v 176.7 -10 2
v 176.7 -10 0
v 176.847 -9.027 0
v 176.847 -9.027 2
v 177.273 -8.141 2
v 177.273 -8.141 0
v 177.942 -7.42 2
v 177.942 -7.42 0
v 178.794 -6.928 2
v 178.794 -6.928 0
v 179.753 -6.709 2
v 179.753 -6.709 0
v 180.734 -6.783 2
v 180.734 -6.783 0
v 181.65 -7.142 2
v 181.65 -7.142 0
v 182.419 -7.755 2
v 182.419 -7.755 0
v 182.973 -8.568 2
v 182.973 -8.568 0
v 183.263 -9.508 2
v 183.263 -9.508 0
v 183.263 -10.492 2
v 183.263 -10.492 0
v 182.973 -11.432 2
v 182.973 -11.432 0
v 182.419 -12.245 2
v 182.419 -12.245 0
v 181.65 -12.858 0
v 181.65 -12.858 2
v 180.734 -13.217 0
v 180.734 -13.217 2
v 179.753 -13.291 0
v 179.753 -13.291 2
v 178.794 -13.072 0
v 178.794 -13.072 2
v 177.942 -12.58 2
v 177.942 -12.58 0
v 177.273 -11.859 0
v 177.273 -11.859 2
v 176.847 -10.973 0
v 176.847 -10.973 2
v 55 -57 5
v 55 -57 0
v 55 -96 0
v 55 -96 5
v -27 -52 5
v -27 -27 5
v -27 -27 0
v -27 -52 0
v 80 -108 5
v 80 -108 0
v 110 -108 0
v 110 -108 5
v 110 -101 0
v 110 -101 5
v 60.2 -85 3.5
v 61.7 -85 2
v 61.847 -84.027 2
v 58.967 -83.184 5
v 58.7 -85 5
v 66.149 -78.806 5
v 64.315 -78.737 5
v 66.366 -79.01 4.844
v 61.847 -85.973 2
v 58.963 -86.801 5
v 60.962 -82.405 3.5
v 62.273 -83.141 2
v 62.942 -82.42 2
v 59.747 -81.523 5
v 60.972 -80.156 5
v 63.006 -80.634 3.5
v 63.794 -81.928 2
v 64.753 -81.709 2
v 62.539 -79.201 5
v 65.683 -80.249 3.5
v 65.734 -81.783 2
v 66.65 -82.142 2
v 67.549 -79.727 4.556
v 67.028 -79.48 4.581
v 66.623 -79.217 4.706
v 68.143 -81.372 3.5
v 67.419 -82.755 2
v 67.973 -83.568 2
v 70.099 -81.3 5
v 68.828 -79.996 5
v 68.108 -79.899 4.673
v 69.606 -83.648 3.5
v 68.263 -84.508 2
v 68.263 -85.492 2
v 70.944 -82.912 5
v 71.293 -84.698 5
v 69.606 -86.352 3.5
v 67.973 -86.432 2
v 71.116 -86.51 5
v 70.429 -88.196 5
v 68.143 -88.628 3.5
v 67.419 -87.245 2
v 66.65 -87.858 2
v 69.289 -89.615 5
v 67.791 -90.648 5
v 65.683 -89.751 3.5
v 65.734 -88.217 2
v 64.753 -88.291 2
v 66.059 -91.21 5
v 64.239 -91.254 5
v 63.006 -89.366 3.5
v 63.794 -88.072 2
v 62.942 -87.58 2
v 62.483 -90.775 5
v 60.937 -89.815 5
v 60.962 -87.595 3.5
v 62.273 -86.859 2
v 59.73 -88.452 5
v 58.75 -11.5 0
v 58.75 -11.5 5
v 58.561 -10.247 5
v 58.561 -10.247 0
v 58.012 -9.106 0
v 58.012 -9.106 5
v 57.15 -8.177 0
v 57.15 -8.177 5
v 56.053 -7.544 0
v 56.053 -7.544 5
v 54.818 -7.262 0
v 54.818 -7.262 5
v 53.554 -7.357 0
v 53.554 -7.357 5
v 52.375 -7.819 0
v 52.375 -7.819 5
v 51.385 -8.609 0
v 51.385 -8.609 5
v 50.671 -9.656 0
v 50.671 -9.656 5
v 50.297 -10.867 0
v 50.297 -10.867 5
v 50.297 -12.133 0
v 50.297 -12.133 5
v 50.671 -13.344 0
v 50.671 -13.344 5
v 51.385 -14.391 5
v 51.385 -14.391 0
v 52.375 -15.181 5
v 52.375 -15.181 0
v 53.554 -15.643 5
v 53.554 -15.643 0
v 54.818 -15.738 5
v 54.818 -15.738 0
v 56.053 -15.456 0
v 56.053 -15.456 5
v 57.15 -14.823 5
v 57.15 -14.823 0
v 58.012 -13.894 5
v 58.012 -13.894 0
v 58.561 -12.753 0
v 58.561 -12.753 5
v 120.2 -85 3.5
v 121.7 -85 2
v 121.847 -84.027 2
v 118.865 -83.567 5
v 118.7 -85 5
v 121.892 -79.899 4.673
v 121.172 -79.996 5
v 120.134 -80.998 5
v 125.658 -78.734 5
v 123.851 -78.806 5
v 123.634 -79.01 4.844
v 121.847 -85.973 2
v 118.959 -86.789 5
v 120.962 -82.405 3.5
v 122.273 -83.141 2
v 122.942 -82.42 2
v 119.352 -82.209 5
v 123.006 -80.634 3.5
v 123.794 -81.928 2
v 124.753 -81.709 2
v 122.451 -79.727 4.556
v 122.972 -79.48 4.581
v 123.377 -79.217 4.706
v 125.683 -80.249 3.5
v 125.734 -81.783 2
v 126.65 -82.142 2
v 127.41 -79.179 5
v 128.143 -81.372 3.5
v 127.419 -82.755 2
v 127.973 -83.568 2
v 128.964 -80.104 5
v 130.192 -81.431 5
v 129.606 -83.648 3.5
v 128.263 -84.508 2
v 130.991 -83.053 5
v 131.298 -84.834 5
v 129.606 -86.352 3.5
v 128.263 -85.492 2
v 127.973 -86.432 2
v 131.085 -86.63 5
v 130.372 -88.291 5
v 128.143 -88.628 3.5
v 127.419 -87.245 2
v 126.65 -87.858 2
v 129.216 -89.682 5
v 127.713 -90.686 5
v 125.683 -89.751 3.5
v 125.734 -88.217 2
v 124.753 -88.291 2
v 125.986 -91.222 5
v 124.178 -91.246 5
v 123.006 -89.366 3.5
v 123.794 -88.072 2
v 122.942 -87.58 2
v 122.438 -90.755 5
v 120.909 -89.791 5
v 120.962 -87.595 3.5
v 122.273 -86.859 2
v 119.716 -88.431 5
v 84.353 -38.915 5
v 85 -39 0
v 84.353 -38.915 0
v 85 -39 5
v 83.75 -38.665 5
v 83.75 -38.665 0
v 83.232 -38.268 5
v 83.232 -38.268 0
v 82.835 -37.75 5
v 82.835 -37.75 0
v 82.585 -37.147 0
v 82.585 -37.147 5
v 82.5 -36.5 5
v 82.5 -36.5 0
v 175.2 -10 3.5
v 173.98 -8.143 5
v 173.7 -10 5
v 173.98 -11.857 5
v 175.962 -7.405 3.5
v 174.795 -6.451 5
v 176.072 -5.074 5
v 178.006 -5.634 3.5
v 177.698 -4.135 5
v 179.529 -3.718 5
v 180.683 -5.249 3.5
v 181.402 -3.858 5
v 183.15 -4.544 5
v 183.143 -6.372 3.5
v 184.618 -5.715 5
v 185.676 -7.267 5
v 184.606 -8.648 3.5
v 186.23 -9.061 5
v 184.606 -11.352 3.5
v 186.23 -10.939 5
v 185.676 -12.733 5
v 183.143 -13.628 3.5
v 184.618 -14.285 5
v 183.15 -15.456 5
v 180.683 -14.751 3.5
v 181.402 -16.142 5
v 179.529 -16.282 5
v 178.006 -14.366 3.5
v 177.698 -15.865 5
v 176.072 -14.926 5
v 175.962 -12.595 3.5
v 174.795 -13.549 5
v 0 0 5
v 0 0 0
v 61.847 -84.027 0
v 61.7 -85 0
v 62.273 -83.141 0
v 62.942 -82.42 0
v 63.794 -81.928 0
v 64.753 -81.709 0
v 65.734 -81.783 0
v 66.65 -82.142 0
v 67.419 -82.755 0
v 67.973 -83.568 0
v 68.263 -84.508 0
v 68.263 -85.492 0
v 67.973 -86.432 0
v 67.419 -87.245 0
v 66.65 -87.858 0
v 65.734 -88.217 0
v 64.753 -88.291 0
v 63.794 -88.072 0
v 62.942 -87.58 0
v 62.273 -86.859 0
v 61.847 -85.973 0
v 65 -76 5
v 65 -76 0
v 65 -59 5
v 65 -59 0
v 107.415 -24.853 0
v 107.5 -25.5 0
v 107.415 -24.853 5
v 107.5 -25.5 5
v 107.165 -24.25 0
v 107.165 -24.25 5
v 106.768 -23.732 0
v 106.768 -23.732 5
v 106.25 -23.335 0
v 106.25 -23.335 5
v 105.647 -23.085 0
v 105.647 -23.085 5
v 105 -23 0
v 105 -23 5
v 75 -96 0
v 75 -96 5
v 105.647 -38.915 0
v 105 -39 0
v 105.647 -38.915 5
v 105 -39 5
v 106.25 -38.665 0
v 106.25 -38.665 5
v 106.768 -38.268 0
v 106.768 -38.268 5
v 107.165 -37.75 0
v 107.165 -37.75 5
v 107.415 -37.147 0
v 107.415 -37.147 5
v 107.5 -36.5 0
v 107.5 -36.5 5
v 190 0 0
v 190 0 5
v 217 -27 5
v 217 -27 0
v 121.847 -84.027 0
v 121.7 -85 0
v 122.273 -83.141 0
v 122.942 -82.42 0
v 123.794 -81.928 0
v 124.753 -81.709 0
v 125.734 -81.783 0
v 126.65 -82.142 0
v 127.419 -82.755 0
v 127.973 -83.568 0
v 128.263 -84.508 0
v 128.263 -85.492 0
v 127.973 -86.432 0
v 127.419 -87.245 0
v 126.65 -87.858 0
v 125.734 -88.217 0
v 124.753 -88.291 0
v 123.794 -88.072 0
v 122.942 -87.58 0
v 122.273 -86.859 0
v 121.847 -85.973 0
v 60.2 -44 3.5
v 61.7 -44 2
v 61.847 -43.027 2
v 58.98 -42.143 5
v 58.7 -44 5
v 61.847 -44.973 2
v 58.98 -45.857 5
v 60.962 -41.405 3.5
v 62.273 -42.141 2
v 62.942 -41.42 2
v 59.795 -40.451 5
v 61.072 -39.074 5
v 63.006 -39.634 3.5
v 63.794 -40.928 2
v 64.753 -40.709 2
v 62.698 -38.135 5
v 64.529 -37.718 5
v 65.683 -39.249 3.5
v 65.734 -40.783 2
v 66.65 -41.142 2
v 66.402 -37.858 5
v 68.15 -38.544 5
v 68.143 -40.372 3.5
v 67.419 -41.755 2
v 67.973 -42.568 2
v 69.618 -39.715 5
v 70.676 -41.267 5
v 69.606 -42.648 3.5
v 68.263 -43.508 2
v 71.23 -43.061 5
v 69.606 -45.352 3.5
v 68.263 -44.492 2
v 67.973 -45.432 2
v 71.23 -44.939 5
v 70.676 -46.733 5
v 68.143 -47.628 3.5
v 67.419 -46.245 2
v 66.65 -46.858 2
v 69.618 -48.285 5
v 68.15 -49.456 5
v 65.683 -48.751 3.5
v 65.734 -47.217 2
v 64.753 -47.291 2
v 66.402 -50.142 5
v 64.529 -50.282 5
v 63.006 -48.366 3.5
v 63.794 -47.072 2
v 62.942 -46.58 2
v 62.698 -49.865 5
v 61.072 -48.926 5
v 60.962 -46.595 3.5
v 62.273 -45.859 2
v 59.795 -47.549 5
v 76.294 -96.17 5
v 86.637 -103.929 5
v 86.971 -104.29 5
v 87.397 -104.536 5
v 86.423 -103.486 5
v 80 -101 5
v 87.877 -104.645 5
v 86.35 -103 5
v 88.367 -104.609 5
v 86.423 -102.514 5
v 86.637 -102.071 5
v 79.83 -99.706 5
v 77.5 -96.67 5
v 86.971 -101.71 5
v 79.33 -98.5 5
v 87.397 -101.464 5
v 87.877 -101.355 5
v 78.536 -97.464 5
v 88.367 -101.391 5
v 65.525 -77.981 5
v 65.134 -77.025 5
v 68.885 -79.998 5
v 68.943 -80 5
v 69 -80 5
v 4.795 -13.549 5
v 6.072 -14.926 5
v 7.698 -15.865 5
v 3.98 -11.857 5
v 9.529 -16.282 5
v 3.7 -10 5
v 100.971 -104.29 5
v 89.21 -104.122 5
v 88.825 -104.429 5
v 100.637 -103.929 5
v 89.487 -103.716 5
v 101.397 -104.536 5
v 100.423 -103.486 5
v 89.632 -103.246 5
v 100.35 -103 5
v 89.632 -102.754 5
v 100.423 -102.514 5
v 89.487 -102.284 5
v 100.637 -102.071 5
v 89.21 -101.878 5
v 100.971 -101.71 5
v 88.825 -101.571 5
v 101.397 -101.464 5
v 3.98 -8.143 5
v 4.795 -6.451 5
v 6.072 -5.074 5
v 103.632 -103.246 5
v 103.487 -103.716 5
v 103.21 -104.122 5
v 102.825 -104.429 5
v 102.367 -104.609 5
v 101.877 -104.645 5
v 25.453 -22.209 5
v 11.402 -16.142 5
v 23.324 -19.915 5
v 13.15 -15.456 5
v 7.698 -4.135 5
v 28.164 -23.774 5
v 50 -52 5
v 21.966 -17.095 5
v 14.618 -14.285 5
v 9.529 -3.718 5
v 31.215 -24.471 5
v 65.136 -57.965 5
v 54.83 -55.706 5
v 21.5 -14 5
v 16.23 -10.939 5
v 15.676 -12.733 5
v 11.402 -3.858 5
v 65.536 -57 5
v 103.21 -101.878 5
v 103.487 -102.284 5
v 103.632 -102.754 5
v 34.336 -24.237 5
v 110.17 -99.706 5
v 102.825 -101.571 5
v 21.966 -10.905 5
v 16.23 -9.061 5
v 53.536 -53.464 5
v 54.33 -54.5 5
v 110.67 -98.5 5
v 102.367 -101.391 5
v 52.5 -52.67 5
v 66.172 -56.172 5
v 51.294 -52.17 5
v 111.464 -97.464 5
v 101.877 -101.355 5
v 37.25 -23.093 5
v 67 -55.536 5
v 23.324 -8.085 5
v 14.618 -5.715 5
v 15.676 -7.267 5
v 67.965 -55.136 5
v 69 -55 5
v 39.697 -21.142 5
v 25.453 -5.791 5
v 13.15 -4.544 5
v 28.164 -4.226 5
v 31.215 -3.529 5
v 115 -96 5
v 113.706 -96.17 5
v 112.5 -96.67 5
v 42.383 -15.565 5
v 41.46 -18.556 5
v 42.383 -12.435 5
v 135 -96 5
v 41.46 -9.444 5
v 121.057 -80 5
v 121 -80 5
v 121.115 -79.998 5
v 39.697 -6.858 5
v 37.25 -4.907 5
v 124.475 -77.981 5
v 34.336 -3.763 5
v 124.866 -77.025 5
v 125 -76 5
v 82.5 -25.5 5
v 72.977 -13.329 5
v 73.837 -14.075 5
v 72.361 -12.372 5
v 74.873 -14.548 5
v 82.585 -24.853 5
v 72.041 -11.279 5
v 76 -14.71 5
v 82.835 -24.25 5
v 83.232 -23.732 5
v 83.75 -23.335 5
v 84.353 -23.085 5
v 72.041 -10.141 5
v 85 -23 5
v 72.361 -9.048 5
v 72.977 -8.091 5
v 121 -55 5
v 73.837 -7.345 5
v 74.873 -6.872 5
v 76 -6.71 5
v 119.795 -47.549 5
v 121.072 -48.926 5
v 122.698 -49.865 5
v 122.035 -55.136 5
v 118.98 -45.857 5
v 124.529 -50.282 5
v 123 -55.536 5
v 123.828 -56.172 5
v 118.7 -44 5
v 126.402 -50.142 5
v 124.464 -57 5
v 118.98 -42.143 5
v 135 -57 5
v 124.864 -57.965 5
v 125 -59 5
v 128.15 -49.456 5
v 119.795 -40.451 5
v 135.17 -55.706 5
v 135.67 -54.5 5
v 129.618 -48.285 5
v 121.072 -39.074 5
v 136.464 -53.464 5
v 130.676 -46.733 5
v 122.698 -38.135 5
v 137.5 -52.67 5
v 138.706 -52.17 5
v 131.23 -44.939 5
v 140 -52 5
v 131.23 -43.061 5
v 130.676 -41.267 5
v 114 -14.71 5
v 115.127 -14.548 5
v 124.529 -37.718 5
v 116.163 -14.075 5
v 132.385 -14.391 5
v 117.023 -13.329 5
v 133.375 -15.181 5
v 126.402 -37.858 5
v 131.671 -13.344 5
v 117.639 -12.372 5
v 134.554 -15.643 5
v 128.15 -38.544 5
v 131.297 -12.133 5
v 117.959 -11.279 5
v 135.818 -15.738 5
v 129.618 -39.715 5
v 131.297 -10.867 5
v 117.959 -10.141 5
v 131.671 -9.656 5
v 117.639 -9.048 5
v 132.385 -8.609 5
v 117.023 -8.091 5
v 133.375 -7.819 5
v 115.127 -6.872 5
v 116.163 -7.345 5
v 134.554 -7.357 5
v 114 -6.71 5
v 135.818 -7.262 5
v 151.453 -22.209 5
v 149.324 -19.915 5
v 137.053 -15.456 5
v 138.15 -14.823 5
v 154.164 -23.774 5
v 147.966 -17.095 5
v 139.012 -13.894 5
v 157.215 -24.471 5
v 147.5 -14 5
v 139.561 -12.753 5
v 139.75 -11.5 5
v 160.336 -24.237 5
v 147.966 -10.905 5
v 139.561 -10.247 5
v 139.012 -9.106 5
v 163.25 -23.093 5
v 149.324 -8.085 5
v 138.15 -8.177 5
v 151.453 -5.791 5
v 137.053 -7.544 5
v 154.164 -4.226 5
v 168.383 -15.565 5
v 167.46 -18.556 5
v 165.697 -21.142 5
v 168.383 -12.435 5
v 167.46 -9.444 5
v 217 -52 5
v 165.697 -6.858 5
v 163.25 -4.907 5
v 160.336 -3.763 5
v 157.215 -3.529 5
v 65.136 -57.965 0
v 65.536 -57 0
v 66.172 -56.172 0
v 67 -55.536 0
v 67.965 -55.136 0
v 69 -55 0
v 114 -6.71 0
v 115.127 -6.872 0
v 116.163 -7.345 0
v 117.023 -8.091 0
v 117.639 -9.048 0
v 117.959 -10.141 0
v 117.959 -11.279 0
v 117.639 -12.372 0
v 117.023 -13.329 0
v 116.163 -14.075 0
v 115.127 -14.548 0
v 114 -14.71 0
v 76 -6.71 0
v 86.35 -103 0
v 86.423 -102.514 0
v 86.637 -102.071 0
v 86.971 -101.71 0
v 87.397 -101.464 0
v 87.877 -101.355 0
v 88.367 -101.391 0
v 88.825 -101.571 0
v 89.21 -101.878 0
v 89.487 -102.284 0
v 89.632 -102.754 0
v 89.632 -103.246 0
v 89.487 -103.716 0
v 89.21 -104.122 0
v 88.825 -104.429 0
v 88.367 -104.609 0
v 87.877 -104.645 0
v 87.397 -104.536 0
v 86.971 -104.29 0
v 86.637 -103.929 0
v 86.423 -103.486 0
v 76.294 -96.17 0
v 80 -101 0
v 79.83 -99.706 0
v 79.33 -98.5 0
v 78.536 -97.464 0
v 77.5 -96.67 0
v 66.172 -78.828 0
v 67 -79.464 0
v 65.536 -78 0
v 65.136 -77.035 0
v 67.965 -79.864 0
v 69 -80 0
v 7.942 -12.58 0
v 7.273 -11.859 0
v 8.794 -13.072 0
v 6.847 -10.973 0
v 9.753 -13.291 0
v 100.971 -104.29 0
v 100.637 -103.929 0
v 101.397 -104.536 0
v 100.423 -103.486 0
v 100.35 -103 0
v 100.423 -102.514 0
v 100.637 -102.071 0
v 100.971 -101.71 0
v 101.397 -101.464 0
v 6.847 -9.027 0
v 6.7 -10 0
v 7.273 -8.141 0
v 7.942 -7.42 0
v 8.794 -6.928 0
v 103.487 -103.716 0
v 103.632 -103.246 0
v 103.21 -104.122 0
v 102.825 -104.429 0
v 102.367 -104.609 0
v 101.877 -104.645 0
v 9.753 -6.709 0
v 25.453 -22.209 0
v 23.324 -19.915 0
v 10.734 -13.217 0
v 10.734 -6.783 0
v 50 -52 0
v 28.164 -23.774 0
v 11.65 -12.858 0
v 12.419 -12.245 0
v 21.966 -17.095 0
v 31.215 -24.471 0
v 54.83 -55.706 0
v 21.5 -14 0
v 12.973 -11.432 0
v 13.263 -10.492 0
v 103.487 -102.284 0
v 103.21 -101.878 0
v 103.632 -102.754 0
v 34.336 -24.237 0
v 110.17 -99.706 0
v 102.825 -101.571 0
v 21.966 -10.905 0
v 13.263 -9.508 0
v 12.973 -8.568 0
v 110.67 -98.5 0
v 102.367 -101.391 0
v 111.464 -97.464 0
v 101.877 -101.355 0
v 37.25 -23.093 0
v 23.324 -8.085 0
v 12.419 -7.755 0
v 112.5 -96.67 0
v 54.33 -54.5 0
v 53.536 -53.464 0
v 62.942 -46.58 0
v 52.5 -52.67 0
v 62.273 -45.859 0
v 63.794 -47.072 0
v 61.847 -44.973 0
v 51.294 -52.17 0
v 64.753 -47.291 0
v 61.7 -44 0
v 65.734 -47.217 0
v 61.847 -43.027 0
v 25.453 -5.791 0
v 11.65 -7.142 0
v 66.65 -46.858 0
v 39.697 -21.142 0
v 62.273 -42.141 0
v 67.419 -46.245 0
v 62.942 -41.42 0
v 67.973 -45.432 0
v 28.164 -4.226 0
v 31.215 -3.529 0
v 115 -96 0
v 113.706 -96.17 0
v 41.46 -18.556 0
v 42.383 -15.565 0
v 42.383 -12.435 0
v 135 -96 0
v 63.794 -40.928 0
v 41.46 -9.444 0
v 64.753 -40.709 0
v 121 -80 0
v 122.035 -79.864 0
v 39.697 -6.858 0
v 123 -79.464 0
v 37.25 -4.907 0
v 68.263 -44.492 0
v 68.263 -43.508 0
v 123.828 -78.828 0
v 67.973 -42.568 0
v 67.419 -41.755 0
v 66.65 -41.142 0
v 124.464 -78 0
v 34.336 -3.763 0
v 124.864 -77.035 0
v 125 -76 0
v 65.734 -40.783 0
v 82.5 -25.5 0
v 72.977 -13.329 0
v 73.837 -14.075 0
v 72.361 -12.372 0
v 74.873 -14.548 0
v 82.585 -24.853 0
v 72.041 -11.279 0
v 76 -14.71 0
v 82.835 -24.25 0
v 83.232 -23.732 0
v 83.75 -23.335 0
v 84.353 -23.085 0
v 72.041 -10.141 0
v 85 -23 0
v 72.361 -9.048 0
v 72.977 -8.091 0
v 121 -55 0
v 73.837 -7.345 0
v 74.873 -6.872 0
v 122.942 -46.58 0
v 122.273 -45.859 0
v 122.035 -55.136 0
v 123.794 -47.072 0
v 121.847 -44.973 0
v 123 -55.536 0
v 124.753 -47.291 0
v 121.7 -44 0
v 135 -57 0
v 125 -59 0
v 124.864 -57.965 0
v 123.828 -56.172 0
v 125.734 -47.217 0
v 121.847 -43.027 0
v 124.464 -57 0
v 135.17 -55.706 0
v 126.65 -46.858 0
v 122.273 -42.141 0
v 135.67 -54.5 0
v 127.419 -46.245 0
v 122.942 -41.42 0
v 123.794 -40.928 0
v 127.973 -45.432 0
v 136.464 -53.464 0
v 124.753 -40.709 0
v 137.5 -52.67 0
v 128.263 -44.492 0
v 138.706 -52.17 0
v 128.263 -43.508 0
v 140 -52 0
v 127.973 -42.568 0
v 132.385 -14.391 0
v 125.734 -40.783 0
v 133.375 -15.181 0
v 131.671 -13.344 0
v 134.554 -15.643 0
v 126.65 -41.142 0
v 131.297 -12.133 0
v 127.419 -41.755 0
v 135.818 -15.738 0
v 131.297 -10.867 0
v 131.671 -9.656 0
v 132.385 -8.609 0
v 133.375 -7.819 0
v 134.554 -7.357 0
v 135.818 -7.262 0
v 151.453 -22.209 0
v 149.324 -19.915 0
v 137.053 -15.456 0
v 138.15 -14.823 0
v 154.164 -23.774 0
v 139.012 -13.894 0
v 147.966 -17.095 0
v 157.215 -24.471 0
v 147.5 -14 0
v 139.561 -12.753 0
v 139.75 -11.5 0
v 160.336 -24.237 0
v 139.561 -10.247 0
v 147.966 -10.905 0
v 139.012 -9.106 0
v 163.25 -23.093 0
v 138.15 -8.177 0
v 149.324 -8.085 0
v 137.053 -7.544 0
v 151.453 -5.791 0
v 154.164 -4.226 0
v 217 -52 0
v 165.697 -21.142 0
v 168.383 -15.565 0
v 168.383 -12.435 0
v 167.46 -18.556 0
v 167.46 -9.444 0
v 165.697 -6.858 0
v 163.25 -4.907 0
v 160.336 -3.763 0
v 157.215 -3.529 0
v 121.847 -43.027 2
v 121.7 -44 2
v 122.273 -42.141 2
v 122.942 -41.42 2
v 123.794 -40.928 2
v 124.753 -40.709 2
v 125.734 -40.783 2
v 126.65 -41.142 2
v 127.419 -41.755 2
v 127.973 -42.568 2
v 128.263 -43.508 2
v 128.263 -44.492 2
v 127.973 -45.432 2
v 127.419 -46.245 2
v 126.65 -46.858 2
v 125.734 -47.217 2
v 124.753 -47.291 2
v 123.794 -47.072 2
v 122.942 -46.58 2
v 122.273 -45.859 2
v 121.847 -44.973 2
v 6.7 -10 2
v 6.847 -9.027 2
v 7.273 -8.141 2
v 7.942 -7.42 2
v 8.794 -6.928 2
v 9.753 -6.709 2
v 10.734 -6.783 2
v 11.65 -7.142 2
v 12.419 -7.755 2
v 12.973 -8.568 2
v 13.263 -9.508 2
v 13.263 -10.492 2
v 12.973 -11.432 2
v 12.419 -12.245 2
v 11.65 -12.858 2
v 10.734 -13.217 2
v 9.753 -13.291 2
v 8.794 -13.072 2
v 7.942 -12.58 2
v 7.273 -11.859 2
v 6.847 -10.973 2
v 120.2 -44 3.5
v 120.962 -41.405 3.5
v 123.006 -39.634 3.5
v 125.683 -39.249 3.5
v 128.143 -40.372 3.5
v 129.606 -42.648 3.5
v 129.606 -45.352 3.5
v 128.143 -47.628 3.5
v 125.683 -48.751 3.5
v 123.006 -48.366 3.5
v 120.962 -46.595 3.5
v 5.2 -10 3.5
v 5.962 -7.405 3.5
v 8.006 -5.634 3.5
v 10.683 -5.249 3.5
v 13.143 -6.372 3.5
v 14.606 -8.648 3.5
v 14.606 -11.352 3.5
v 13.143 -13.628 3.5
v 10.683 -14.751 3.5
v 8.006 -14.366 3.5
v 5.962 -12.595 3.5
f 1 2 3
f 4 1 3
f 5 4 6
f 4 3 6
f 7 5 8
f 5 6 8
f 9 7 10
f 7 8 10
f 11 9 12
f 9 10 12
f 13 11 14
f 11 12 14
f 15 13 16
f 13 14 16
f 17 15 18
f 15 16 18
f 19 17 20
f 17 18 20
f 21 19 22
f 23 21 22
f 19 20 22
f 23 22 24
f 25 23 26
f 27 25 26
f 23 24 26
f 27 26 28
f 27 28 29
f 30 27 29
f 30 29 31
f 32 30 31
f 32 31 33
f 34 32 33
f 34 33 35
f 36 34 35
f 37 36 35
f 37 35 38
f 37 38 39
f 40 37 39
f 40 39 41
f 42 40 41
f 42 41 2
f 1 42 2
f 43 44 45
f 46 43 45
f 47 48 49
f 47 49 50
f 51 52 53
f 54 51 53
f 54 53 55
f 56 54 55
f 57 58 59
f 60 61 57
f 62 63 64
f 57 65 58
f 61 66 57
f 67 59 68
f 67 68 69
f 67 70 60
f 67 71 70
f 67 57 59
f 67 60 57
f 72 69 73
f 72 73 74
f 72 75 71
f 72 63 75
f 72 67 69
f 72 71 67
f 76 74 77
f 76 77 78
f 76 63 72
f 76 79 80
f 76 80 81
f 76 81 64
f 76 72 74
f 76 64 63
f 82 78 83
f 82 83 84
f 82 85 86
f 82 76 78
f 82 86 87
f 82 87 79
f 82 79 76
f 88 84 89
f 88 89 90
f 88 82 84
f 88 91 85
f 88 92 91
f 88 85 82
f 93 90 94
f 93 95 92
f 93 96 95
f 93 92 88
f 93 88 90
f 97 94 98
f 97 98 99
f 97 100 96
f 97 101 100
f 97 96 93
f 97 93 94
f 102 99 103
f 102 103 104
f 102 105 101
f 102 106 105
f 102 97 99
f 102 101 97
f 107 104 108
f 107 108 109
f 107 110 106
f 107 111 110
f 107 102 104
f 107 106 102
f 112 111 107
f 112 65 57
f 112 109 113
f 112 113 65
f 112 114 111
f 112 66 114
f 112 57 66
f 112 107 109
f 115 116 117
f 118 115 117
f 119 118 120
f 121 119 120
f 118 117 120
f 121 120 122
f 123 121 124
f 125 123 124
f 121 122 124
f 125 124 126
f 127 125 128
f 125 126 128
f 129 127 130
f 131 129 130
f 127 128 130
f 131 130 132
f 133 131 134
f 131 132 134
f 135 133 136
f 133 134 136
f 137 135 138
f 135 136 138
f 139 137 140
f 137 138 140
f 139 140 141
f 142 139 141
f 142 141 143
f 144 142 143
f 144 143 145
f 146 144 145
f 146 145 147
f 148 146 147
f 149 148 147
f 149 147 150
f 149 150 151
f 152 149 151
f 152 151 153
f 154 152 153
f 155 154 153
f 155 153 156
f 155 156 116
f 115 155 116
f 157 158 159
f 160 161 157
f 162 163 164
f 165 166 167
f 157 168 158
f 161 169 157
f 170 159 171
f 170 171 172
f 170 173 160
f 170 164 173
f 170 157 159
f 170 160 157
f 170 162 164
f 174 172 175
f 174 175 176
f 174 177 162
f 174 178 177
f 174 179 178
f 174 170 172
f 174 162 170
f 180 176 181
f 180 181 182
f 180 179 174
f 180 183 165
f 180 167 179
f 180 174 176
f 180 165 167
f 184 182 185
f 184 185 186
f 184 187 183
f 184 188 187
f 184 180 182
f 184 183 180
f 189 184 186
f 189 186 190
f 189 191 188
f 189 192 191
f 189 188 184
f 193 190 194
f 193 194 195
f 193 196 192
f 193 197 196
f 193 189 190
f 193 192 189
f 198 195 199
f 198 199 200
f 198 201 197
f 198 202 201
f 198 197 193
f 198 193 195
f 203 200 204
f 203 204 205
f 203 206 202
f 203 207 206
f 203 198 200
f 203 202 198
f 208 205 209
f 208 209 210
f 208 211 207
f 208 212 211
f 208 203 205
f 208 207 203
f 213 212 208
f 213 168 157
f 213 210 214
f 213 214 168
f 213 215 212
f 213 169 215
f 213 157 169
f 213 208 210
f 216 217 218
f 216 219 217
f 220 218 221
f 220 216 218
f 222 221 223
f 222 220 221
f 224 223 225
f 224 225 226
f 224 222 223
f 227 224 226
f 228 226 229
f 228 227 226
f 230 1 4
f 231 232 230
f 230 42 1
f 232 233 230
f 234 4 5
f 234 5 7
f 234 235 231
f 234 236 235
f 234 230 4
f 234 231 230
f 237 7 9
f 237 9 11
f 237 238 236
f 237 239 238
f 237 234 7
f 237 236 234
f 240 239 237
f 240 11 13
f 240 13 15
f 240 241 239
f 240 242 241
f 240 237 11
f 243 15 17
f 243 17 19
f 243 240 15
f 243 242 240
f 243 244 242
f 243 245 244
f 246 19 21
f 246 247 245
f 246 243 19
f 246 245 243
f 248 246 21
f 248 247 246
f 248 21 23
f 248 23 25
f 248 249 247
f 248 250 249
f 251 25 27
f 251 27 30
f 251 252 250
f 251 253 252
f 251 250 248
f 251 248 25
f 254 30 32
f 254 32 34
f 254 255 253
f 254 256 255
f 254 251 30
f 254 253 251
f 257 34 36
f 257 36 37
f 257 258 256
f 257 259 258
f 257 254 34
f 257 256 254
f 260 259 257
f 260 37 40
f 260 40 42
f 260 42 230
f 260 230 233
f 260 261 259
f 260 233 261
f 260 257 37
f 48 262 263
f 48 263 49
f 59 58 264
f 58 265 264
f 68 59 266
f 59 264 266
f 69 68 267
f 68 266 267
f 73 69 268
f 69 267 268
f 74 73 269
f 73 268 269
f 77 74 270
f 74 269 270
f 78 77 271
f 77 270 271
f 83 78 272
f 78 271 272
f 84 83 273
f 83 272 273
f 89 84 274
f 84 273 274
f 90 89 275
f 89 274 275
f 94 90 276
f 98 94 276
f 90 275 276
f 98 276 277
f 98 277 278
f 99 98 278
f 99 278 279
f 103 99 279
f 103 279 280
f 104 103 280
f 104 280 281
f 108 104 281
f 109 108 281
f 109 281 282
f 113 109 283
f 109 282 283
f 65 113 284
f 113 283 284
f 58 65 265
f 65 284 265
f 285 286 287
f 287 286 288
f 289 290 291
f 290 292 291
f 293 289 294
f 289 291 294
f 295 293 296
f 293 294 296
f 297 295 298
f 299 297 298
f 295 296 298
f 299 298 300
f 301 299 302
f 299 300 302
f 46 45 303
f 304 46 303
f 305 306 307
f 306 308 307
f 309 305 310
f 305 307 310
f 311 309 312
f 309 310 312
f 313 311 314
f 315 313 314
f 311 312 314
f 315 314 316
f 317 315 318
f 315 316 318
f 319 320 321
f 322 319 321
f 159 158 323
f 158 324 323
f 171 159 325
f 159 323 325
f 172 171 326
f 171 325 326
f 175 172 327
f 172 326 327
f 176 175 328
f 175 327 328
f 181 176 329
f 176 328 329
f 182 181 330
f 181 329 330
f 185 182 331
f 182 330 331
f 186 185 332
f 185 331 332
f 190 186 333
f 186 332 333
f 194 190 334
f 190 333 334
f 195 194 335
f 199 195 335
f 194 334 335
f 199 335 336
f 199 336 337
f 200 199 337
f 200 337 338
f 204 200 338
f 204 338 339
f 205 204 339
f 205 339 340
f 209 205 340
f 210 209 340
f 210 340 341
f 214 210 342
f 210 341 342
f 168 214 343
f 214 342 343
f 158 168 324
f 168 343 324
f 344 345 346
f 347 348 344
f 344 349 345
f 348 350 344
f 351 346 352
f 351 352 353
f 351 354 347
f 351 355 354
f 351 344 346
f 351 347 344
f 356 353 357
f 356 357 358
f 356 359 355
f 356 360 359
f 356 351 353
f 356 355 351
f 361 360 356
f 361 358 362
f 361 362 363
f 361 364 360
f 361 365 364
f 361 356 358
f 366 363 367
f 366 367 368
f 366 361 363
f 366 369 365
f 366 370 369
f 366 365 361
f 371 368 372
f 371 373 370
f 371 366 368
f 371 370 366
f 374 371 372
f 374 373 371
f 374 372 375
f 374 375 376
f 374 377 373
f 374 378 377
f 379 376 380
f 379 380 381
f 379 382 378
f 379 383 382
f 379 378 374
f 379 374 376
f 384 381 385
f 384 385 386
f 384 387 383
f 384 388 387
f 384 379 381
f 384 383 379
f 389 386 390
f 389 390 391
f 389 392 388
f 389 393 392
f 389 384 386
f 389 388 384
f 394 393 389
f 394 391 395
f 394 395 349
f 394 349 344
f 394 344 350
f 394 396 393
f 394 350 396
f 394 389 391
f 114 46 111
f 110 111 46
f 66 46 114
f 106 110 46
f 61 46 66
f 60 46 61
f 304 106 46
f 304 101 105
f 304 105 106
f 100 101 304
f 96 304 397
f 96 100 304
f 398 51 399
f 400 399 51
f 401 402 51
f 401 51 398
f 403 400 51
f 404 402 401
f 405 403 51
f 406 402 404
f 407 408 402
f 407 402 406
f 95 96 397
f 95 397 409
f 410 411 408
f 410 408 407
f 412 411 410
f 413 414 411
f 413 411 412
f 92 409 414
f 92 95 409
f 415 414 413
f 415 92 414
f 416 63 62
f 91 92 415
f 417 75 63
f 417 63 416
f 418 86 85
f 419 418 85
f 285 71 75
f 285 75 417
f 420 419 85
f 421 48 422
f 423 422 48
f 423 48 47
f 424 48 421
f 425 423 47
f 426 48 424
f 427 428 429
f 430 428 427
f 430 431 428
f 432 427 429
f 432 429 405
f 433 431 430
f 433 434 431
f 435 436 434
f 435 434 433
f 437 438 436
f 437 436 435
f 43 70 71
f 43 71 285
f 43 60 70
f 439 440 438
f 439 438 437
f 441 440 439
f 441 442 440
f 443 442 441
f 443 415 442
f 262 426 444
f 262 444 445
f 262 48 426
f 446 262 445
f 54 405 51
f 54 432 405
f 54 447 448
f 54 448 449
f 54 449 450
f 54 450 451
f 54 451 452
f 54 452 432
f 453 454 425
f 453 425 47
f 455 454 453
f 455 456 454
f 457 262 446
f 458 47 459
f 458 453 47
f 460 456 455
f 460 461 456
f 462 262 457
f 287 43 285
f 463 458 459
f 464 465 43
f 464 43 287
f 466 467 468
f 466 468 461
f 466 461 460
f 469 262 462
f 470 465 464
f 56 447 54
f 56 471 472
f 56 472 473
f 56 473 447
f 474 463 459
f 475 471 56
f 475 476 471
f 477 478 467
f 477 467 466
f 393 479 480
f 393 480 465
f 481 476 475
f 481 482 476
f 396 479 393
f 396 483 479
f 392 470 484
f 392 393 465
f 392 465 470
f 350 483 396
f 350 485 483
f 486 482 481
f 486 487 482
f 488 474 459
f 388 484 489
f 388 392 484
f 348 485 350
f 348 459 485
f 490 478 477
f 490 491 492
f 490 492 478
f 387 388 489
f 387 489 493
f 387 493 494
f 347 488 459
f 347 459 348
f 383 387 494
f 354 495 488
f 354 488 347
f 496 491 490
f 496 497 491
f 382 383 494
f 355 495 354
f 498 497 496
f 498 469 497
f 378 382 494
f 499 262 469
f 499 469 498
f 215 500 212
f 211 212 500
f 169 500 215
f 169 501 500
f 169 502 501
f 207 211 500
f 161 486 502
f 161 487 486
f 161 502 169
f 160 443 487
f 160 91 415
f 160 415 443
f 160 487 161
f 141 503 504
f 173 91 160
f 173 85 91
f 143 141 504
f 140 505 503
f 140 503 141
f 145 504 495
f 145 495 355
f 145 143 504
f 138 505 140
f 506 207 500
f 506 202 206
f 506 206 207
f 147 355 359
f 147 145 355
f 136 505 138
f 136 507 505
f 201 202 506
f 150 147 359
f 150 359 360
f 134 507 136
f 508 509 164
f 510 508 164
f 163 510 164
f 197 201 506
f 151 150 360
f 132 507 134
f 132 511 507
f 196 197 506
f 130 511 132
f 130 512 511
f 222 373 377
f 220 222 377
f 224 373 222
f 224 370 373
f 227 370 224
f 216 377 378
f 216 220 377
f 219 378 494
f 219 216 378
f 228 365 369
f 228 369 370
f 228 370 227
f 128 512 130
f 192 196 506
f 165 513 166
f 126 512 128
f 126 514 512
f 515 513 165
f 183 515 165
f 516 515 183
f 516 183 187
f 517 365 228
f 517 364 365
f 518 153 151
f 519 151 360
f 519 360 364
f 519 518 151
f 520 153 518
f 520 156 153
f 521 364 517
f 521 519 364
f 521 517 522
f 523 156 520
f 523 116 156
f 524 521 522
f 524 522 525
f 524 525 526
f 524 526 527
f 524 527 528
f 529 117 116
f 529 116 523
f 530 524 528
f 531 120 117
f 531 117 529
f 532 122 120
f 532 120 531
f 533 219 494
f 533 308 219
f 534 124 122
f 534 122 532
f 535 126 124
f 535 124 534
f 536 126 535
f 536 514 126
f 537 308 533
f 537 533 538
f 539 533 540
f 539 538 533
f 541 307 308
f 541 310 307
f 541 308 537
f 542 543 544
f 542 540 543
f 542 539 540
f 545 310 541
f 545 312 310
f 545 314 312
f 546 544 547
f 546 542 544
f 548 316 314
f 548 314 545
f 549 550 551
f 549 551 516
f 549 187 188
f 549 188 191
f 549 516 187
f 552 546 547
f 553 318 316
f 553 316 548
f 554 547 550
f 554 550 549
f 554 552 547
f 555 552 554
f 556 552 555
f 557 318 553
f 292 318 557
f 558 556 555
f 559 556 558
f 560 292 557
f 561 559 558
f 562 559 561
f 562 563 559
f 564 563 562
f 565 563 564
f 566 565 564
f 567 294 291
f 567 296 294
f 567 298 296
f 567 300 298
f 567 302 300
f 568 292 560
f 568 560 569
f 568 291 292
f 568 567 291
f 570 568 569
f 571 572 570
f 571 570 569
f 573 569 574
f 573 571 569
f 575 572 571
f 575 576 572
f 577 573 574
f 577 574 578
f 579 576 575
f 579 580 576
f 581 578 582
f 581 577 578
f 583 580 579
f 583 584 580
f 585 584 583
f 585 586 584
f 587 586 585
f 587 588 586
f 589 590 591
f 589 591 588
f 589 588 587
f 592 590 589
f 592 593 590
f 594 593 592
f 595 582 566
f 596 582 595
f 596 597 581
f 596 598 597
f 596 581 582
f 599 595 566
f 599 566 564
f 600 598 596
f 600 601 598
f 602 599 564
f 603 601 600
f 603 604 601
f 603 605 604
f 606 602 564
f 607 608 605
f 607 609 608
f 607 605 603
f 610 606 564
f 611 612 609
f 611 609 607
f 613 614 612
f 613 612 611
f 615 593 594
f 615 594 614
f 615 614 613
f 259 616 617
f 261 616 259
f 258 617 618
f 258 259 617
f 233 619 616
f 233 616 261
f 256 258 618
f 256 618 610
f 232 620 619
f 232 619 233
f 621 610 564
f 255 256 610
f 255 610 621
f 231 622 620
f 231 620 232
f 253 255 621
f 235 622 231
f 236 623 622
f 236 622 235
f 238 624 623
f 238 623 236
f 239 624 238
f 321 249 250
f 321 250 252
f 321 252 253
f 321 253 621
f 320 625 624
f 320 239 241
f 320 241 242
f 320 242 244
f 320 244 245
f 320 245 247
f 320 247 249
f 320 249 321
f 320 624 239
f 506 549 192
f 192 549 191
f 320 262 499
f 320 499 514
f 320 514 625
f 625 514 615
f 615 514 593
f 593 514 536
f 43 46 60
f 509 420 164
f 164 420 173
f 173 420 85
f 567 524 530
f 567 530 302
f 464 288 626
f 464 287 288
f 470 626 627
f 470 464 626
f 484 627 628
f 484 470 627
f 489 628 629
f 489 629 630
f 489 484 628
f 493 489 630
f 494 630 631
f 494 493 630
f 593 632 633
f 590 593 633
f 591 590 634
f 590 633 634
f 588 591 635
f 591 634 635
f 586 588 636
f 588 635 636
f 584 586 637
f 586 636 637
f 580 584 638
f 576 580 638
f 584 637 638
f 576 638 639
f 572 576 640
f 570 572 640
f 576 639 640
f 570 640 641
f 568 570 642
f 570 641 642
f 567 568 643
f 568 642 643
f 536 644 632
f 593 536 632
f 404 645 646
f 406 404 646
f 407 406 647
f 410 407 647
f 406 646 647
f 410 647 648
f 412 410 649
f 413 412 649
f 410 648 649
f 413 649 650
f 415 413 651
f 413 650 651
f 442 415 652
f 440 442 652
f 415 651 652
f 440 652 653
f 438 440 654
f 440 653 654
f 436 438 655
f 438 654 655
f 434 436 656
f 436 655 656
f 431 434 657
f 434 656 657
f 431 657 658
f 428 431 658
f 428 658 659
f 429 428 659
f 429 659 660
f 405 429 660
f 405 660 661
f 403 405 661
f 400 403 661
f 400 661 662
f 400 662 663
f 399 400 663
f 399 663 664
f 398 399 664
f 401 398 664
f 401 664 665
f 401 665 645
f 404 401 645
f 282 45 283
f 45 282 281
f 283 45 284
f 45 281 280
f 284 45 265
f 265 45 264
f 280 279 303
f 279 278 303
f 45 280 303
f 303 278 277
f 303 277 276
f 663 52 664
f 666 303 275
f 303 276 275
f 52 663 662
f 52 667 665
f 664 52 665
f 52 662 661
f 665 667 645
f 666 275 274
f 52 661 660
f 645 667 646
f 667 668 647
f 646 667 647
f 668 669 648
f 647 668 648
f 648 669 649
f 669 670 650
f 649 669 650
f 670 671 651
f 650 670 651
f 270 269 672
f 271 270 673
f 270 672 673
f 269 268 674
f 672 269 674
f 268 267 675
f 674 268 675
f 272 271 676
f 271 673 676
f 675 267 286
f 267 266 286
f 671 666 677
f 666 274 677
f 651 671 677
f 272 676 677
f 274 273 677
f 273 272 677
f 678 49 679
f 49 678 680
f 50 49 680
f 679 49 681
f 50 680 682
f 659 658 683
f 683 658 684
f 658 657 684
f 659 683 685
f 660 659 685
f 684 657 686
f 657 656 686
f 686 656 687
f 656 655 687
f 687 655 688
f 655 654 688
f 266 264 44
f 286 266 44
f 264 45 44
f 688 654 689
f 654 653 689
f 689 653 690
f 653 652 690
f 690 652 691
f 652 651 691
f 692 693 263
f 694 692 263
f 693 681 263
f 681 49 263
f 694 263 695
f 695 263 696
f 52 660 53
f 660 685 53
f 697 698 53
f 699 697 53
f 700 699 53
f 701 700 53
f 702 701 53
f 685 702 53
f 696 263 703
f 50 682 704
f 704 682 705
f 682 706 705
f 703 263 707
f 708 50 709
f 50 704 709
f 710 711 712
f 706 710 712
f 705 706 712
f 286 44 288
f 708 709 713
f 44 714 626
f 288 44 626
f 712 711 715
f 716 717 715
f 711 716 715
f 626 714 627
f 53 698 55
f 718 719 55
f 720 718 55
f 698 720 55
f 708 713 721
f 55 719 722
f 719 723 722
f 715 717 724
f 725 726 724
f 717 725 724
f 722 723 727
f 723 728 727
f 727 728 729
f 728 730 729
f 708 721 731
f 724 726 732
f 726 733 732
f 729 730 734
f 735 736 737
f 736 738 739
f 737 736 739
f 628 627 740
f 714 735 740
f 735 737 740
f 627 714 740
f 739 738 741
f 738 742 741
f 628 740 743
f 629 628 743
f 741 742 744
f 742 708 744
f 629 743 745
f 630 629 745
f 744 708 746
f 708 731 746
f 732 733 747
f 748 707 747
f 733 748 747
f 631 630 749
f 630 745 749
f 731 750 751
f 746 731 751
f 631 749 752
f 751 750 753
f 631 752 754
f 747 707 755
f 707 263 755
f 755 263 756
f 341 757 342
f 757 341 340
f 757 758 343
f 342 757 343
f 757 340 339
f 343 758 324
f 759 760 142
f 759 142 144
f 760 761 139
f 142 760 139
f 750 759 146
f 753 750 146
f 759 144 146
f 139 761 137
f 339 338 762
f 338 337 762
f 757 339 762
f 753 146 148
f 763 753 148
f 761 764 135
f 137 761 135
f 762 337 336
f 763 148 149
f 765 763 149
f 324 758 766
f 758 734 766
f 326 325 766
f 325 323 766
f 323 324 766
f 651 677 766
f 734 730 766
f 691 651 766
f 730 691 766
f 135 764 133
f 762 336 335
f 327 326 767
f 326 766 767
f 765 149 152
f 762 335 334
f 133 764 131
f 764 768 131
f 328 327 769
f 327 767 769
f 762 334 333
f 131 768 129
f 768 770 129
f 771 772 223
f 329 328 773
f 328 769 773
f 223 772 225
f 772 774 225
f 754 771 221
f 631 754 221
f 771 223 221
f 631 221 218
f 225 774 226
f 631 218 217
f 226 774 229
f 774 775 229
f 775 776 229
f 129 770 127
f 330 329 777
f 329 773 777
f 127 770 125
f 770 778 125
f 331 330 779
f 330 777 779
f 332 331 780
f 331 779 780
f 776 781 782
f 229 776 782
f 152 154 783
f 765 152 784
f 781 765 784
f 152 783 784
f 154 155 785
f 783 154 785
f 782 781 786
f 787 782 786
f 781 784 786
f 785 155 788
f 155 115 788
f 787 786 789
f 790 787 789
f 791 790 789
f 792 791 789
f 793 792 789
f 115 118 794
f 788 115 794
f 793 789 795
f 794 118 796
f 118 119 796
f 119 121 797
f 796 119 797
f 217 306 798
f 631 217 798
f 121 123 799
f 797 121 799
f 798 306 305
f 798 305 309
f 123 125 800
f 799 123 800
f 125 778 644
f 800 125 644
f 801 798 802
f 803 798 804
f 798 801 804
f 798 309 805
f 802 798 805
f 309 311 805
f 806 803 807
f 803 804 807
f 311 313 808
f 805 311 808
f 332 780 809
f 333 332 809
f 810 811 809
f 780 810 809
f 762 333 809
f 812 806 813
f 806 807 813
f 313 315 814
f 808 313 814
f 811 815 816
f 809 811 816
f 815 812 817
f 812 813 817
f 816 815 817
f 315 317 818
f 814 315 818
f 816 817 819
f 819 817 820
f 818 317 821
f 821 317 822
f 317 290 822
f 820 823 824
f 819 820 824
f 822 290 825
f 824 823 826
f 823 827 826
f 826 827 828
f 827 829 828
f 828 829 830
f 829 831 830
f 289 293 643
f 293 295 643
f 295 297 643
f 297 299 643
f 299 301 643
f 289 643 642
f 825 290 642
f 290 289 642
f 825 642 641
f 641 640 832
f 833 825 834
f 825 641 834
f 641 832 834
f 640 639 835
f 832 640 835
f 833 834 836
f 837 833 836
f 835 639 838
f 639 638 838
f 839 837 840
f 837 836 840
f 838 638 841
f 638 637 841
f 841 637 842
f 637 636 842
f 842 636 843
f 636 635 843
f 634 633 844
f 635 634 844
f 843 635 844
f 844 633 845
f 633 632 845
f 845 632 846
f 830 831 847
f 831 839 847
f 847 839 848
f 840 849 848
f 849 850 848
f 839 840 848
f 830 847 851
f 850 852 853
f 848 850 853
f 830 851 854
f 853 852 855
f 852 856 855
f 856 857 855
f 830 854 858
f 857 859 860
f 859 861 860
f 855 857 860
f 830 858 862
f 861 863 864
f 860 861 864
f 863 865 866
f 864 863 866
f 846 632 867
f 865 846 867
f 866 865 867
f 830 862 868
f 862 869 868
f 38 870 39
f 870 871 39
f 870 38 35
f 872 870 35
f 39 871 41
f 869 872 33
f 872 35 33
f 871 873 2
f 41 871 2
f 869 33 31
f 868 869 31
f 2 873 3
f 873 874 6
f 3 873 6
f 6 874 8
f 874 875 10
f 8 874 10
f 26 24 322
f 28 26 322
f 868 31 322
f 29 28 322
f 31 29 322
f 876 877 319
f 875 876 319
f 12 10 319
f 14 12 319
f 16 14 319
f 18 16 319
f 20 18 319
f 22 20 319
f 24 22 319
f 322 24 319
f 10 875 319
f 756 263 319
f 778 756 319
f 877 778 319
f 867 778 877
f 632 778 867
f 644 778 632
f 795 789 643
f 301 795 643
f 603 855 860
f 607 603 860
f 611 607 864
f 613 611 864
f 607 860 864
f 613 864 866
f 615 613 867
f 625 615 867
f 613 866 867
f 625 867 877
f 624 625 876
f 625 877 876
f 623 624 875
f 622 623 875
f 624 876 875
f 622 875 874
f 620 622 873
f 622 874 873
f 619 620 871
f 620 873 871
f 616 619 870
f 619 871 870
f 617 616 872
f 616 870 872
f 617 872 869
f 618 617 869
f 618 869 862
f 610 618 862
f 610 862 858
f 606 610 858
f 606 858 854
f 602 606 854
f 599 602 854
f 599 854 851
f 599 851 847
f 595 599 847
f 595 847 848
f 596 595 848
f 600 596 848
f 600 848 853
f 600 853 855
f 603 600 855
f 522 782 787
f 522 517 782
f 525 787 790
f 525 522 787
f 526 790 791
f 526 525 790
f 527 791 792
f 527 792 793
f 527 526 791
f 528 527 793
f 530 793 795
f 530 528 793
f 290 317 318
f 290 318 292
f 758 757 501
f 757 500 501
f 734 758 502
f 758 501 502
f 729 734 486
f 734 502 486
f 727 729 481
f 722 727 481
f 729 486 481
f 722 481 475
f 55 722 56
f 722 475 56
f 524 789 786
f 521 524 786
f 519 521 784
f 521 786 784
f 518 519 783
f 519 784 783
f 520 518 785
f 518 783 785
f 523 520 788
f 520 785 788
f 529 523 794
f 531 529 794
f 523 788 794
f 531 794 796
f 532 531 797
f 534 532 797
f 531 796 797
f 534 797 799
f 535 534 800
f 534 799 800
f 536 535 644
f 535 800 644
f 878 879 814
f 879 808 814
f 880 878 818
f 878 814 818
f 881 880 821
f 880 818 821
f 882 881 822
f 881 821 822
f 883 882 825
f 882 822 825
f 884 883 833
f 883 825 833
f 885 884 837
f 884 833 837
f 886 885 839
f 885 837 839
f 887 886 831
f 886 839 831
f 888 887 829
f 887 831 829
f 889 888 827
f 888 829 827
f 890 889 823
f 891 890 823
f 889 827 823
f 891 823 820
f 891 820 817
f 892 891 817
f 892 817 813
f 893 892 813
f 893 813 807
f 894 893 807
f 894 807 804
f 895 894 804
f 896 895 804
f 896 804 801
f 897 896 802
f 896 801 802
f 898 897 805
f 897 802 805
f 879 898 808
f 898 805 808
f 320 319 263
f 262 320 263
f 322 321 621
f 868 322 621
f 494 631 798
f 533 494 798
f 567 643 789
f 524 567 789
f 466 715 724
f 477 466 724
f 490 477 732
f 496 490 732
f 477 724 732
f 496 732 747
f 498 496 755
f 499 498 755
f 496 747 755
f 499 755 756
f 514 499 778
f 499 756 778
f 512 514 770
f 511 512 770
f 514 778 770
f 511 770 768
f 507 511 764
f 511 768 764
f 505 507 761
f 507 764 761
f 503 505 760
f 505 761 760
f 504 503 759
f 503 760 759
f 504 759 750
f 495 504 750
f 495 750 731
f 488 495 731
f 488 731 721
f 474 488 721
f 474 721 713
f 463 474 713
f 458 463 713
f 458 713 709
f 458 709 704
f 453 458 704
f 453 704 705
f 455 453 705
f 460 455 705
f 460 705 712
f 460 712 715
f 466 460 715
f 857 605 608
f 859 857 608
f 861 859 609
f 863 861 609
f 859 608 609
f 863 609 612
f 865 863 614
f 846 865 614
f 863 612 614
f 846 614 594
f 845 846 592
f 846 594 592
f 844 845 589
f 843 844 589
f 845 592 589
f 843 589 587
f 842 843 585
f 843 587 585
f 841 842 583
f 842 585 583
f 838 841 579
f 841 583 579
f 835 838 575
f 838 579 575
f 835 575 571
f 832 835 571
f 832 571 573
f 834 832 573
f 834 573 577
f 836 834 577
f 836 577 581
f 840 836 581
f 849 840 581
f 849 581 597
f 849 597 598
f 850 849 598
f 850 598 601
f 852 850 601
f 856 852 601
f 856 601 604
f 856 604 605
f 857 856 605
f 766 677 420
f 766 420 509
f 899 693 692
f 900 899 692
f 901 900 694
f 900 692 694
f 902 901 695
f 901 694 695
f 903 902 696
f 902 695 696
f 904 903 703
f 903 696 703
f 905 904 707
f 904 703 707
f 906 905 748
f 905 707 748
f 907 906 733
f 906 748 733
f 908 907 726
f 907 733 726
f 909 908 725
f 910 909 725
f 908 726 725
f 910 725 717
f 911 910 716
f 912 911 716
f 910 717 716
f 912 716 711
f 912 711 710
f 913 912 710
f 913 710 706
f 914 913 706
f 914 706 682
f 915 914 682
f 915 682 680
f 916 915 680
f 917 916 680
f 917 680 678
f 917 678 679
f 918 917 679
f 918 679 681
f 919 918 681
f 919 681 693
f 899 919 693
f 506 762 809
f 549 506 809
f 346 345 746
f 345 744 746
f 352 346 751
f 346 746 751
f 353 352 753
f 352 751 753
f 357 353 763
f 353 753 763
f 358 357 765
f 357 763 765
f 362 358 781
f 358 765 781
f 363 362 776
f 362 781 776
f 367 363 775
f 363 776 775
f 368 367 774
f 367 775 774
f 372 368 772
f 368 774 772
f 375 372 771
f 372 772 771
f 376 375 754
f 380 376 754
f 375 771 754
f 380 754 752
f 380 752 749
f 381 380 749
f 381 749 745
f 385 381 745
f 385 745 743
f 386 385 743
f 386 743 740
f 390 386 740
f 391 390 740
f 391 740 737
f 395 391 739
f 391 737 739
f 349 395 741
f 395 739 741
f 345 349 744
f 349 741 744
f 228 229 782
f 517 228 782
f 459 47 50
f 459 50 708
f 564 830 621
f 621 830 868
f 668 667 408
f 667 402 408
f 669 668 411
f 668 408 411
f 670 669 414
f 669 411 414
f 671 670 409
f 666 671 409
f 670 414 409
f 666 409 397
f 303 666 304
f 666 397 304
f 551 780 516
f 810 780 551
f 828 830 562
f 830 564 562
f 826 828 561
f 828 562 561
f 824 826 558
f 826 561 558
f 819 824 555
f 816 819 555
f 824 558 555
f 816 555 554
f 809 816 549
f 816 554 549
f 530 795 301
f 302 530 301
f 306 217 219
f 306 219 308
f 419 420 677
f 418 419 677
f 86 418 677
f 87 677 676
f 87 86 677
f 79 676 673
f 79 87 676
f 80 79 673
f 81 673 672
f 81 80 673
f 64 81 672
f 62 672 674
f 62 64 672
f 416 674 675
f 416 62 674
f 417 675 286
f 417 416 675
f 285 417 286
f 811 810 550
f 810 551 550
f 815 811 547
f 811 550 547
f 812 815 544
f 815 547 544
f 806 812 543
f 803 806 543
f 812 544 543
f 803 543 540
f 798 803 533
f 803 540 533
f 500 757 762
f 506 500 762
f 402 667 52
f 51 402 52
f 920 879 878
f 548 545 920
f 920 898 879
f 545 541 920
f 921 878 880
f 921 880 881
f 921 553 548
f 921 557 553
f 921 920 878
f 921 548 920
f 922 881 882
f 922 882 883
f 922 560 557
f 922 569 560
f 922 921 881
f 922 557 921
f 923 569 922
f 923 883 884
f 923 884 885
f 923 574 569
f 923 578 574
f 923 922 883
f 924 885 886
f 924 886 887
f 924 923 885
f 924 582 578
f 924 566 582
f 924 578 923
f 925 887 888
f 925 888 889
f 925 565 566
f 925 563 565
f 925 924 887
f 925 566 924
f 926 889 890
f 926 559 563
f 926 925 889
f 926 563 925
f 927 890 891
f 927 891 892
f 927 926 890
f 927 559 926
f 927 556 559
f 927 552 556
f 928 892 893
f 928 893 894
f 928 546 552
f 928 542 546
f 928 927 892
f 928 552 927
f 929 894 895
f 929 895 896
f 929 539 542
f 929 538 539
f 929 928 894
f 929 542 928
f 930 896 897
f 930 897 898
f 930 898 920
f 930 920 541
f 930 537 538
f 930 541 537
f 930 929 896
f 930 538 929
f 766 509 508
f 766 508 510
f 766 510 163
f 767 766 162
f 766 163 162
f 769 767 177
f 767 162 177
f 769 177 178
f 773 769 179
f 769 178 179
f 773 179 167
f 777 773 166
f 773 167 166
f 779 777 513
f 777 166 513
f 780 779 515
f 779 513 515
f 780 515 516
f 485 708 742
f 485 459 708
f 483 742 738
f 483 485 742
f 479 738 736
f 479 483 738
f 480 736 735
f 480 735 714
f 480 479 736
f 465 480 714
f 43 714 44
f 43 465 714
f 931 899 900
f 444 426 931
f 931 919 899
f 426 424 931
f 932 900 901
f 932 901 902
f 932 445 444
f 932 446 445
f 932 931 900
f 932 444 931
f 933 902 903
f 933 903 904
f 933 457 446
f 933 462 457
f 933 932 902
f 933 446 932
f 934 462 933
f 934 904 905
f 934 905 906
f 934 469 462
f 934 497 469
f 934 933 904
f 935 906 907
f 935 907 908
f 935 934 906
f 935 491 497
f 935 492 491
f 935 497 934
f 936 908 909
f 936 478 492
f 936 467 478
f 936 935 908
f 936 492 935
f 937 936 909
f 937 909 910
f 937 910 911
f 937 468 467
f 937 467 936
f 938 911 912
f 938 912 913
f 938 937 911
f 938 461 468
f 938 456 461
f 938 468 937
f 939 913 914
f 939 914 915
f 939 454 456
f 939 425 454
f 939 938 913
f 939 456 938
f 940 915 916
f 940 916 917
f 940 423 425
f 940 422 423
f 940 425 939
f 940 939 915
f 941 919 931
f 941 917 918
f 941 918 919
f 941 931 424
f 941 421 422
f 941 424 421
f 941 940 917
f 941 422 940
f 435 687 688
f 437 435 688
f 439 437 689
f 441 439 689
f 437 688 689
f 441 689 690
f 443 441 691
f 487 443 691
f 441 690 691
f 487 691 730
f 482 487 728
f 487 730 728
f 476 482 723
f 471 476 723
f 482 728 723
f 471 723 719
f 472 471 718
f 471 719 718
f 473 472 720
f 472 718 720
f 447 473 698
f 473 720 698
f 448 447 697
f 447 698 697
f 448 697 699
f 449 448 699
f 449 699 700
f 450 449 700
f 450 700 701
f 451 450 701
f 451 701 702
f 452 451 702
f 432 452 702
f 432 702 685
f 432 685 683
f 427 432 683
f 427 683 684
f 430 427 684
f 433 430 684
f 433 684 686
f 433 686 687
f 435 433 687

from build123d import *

# Parameters (mm, degrees)
ESQUISSE1_W             = 25
ESQUISSE1_H             = 16
ESQUISSE1_W_2           = 60
ESQUISSE1_H_2           = 25
BOSS_EXTRU_1_DEPTH      = 5
CONG_1_R                = 2.5
CONG_2_R                = 4
CONG_3_R                = 5
D_GAGEMENT_M61_D        = 6.6
D_GAGEMENT_M201_D       = 21
ENL_V_MAT_EXTRU_1_REACH = 220.607
ESQUISSE11_R            = 4.25
BOSS_EXTRU_2_DEPTH      = 5
D_GAGEMENT_M62_D        = 6.6
D_GAGEMENT_M62_DEPTH    = 5
D_GAGEMENT_M62_TIP      = 1.982840043
CONG_4_R                = 5
TROU_TARAUD_M4X0_71_D   = 3.3
CHANFREIN1_SIZE         = 3


with BuildPart() as part:
    # Esquisse1 → Boss.-Extru.1 (new body)
    with BuildSketch(Plane.XY):
        Polygon((0, 0), (0, -52), (55, -52), (55, -96), (80, -96), (80, -108), (110, -108), (110, -96), (135, -96), (135, -52), (190, -52), (190, 0), align=None)
        with Locations((95, -31)):
            Rectangle(ESQUISSE1_W, ESQUISSE1_H, mode=Mode.SUBTRACT)
        with Locations((95, -67.5)):
            Rectangle(ESQUISSE1_W_2, ESQUISSE1_H_2, mode=Mode.SUBTRACT)
        with BuildLine():
            Line((76, -6.71), (114, -6.71))
            ThreePointArc((114, -6.71), (118, -10.71), (114, -14.71))
            Line((114, -14.71), (76, -14.71))
            ThreePointArc((76, -14.71), (72, -10.71), (76, -6.71))
        make_face(mode=Mode.SUBTRACT)
    extrude(amount=BOSS_EXTRU_1_DEPTH)

    # Congé1
    cong_1_edges = [part.edges().sort_by_distance(p)[0] for p in [
        (82.5, -23, 2.5),
        (82.5, -39, 2.5),
        (107.5, -39, 2.5),
        (107.5, -23, 2.5),
    ]]
    fillet(cong_1_edges, radius=CONG_1_R)

    # Congé2
    cong_2_edges = [part.edges().sort_by_distance(p)[0] for p in [
        (65, -55, 2.5),
        (65, -80, 2.5),
        (125, -80, 2.5),
        (125, -55, 2.5),
    ]]
    fillet(cong_2_edges, radius=CONG_2_R)

    # Congé3
    cong_3_edges = [part.edges().sort_by_distance(p)[0] for p in [
        (135, -52, 2.5),
        (55, -52, 2.5),
    ]]
    fillet(cong_3_edges, radius=CONG_3_R)

    # Dégagement M61 (through all)
    with Locations(Plane.XY.offset(5)):
        with Locations((10, -10), (180, -10)):
            Hole(D_GAGEMENT_M61_D / 2)

    # Dégagement M201 (through all)
    with Locations(Plane.XY.offset(5)):
        with Locations((32, -14), (158, -14)):
            Hole(D_GAGEMENT_M201_D / 2)

    # Esquisse11 → Enlèv. mat.-Extru.1 (cut, up to next)
    with BuildSketch(Plane.XY.offset(5), mode=Mode.PRIVATE) as enl_v_mat_extru_1_sk1:
        with Locations((54.5, -11.5)):
            Circle(ESQUISSE11_R)
    enl_v_mat_extru_1_tool1 = extrude(enl_v_mat_extru_1_sk1.sketch, amount=-ENL_V_MAT_EXTRU_1_REACH, mode=Mode.PRIVATE) & part.part
    # Esquisse11 → Enlèv. mat.-Extru.1 (cut, up to next)
    with BuildSketch(Plane.XY.offset(5), mode=Mode.PRIVATE) as enl_v_mat_extru_1_sk2:
        with Locations((135.5, -11.5)):
            Circle(ESQUISSE11_R)
    enl_v_mat_extru_1_tool2 = extrude(enl_v_mat_extru_1_sk2.sketch, amount=-ENL_V_MAT_EXTRU_1_REACH, mode=Mode.PRIVATE) & part.part
    add(enl_v_mat_extru_1_tool1.solids().sort_by_distance((54.5, -11.5, 5))[0], mode=Mode.SUBTRACT)
    add(enl_v_mat_extru_1_tool2.solids().sort_by_distance((135.5, -11.5, 5))[0], mode=Mode.SUBTRACT)

    # Esquisse13 → Boss.-Extru.2 (add)
    with BuildSketch(Plane.XY.offset(5)):
        Polygon((0, 0), (-27, -27), (-27, -52), (0, -52), align=None)
        Polygon((217, -52), (190, -52), (190, 0), (217, -27), align=None)
    extrude(amount=-BOSS_EXTRU_2_DEPTH)

    # Dégagement M62
    with Locations(Plane.XY.offset(5)):
        with Locations((65, -44), (125, -44), (125, -85), (65, -85)):
            Hole(D_GAGEMENT_M62_D / 2, depth=D_GAGEMENT_M62_DEPTH)
            with Locations((0, 0, -(D_GAGEMENT_M62_DEPTH + D_GAGEMENT_M62_TIP / 2))):  # 118° drill point
                Cone(0, D_GAGEMENT_M62_D / 2, D_GAGEMENT_M62_TIP, mode=Mode.SUBTRACT)

    # Congé4
    cong_4_edges = [part.edges().sort_by_distance(p)[0] for p in [
        (110, -96, 2.5),
        (80, -96, 2.5),
    ]]
    fillet(cong_4_edges, radius=CONG_4_R)

    # Trou taraudé M4x0.71 (through all)
    with Locations(Plane.XY.offset(5)):
        with Locations((88, -103), (102, -103)):
            Hole(TROU_TARAUD_M4X0_71_D / 2)

    # Chanfrein1
    # the kernel refuses this chamfer: 3 mm, written as the material it takes off along each edge
    with BuildSketch(Plane(origin=(180, -10, 5), x_dir=(-1, 0, 0), z_dir=(0, -1, 0))) as chanfrein1_piece_1:
        Polygon((3.3, CHANFREIN1_SIZE), (3.3 + CHANFREIN1_SIZE, 0), (3.3, 0), align=None)
    revolve(axis=Axis((180, -10, 5), (0, 0, -1)), mode=Mode.SUBTRACT)
    with BuildSketch(Plane(origin=(10, -10, 5), x_dir=(-1, 0, 0), z_dir=(0, -1, 0))) as chanfrein1_piece_2:
        Polygon((3.3, CHANFREIN1_SIZE), (3.3 + CHANFREIN1_SIZE, 0), (3.3, 0), align=None)
    revolve(axis=Axis((10, -10, 5), (0, 0, -1)), mode=Mode.SUBTRACT)
    with BuildSketch(Plane(origin=(65, -85, 5), x_dir=(-1, 0, 0), z_dir=(0, -1, 0))) as chanfrein1_piece_3:
        Polygon((3.3, CHANFREIN1_SIZE), (3.3 + CHANFREIN1_SIZE, 0), (3.3, 0), align=None)
    revolve(axis=Axis((65, -85, 5), (0, 0, -1)), mode=Mode.SUBTRACT)
    with BuildSketch(Plane(origin=(125, -85, 5), x_dir=(-1, 0, 0), z_dir=(0, -1, 0))) as chanfrein1_piece_4:
        Polygon((3.3, CHANFREIN1_SIZE), (3.3 + CHANFREIN1_SIZE, 0), (3.3, 0), align=None)
    revolve(axis=Axis((125, -85, 5), (0, 0, -1)), mode=Mode.SUBTRACT)
    with BuildSketch(Plane(origin=(125, -44, 5), x_dir=(-1, 0, 0), z_dir=(0, -1, 0))) as chanfrein1_piece_5:
        Polygon((3.3, CHANFREIN1_SIZE), (3.3 + CHANFREIN1_SIZE, 0), (3.3, 0), align=None)
    revolve(axis=Axis((125, -44, 5), (0, 0, -1)), mode=Mode.SUBTRACT)
    with BuildSketch(Plane(origin=(65, -44, 5), x_dir=(-1, 0, 0), z_dir=(0, -1, 0))) as chanfrein1_piece_6:
        Polygon((3.3, CHANFREIN1_SIZE), (3.3 + CHANFREIN1_SIZE, 0), (3.3, 0), align=None)
    revolve(axis=Axis((65, -44, 5), (0, 0, -1)), mode=Mode.SUBTRACT)


solid = part.part
